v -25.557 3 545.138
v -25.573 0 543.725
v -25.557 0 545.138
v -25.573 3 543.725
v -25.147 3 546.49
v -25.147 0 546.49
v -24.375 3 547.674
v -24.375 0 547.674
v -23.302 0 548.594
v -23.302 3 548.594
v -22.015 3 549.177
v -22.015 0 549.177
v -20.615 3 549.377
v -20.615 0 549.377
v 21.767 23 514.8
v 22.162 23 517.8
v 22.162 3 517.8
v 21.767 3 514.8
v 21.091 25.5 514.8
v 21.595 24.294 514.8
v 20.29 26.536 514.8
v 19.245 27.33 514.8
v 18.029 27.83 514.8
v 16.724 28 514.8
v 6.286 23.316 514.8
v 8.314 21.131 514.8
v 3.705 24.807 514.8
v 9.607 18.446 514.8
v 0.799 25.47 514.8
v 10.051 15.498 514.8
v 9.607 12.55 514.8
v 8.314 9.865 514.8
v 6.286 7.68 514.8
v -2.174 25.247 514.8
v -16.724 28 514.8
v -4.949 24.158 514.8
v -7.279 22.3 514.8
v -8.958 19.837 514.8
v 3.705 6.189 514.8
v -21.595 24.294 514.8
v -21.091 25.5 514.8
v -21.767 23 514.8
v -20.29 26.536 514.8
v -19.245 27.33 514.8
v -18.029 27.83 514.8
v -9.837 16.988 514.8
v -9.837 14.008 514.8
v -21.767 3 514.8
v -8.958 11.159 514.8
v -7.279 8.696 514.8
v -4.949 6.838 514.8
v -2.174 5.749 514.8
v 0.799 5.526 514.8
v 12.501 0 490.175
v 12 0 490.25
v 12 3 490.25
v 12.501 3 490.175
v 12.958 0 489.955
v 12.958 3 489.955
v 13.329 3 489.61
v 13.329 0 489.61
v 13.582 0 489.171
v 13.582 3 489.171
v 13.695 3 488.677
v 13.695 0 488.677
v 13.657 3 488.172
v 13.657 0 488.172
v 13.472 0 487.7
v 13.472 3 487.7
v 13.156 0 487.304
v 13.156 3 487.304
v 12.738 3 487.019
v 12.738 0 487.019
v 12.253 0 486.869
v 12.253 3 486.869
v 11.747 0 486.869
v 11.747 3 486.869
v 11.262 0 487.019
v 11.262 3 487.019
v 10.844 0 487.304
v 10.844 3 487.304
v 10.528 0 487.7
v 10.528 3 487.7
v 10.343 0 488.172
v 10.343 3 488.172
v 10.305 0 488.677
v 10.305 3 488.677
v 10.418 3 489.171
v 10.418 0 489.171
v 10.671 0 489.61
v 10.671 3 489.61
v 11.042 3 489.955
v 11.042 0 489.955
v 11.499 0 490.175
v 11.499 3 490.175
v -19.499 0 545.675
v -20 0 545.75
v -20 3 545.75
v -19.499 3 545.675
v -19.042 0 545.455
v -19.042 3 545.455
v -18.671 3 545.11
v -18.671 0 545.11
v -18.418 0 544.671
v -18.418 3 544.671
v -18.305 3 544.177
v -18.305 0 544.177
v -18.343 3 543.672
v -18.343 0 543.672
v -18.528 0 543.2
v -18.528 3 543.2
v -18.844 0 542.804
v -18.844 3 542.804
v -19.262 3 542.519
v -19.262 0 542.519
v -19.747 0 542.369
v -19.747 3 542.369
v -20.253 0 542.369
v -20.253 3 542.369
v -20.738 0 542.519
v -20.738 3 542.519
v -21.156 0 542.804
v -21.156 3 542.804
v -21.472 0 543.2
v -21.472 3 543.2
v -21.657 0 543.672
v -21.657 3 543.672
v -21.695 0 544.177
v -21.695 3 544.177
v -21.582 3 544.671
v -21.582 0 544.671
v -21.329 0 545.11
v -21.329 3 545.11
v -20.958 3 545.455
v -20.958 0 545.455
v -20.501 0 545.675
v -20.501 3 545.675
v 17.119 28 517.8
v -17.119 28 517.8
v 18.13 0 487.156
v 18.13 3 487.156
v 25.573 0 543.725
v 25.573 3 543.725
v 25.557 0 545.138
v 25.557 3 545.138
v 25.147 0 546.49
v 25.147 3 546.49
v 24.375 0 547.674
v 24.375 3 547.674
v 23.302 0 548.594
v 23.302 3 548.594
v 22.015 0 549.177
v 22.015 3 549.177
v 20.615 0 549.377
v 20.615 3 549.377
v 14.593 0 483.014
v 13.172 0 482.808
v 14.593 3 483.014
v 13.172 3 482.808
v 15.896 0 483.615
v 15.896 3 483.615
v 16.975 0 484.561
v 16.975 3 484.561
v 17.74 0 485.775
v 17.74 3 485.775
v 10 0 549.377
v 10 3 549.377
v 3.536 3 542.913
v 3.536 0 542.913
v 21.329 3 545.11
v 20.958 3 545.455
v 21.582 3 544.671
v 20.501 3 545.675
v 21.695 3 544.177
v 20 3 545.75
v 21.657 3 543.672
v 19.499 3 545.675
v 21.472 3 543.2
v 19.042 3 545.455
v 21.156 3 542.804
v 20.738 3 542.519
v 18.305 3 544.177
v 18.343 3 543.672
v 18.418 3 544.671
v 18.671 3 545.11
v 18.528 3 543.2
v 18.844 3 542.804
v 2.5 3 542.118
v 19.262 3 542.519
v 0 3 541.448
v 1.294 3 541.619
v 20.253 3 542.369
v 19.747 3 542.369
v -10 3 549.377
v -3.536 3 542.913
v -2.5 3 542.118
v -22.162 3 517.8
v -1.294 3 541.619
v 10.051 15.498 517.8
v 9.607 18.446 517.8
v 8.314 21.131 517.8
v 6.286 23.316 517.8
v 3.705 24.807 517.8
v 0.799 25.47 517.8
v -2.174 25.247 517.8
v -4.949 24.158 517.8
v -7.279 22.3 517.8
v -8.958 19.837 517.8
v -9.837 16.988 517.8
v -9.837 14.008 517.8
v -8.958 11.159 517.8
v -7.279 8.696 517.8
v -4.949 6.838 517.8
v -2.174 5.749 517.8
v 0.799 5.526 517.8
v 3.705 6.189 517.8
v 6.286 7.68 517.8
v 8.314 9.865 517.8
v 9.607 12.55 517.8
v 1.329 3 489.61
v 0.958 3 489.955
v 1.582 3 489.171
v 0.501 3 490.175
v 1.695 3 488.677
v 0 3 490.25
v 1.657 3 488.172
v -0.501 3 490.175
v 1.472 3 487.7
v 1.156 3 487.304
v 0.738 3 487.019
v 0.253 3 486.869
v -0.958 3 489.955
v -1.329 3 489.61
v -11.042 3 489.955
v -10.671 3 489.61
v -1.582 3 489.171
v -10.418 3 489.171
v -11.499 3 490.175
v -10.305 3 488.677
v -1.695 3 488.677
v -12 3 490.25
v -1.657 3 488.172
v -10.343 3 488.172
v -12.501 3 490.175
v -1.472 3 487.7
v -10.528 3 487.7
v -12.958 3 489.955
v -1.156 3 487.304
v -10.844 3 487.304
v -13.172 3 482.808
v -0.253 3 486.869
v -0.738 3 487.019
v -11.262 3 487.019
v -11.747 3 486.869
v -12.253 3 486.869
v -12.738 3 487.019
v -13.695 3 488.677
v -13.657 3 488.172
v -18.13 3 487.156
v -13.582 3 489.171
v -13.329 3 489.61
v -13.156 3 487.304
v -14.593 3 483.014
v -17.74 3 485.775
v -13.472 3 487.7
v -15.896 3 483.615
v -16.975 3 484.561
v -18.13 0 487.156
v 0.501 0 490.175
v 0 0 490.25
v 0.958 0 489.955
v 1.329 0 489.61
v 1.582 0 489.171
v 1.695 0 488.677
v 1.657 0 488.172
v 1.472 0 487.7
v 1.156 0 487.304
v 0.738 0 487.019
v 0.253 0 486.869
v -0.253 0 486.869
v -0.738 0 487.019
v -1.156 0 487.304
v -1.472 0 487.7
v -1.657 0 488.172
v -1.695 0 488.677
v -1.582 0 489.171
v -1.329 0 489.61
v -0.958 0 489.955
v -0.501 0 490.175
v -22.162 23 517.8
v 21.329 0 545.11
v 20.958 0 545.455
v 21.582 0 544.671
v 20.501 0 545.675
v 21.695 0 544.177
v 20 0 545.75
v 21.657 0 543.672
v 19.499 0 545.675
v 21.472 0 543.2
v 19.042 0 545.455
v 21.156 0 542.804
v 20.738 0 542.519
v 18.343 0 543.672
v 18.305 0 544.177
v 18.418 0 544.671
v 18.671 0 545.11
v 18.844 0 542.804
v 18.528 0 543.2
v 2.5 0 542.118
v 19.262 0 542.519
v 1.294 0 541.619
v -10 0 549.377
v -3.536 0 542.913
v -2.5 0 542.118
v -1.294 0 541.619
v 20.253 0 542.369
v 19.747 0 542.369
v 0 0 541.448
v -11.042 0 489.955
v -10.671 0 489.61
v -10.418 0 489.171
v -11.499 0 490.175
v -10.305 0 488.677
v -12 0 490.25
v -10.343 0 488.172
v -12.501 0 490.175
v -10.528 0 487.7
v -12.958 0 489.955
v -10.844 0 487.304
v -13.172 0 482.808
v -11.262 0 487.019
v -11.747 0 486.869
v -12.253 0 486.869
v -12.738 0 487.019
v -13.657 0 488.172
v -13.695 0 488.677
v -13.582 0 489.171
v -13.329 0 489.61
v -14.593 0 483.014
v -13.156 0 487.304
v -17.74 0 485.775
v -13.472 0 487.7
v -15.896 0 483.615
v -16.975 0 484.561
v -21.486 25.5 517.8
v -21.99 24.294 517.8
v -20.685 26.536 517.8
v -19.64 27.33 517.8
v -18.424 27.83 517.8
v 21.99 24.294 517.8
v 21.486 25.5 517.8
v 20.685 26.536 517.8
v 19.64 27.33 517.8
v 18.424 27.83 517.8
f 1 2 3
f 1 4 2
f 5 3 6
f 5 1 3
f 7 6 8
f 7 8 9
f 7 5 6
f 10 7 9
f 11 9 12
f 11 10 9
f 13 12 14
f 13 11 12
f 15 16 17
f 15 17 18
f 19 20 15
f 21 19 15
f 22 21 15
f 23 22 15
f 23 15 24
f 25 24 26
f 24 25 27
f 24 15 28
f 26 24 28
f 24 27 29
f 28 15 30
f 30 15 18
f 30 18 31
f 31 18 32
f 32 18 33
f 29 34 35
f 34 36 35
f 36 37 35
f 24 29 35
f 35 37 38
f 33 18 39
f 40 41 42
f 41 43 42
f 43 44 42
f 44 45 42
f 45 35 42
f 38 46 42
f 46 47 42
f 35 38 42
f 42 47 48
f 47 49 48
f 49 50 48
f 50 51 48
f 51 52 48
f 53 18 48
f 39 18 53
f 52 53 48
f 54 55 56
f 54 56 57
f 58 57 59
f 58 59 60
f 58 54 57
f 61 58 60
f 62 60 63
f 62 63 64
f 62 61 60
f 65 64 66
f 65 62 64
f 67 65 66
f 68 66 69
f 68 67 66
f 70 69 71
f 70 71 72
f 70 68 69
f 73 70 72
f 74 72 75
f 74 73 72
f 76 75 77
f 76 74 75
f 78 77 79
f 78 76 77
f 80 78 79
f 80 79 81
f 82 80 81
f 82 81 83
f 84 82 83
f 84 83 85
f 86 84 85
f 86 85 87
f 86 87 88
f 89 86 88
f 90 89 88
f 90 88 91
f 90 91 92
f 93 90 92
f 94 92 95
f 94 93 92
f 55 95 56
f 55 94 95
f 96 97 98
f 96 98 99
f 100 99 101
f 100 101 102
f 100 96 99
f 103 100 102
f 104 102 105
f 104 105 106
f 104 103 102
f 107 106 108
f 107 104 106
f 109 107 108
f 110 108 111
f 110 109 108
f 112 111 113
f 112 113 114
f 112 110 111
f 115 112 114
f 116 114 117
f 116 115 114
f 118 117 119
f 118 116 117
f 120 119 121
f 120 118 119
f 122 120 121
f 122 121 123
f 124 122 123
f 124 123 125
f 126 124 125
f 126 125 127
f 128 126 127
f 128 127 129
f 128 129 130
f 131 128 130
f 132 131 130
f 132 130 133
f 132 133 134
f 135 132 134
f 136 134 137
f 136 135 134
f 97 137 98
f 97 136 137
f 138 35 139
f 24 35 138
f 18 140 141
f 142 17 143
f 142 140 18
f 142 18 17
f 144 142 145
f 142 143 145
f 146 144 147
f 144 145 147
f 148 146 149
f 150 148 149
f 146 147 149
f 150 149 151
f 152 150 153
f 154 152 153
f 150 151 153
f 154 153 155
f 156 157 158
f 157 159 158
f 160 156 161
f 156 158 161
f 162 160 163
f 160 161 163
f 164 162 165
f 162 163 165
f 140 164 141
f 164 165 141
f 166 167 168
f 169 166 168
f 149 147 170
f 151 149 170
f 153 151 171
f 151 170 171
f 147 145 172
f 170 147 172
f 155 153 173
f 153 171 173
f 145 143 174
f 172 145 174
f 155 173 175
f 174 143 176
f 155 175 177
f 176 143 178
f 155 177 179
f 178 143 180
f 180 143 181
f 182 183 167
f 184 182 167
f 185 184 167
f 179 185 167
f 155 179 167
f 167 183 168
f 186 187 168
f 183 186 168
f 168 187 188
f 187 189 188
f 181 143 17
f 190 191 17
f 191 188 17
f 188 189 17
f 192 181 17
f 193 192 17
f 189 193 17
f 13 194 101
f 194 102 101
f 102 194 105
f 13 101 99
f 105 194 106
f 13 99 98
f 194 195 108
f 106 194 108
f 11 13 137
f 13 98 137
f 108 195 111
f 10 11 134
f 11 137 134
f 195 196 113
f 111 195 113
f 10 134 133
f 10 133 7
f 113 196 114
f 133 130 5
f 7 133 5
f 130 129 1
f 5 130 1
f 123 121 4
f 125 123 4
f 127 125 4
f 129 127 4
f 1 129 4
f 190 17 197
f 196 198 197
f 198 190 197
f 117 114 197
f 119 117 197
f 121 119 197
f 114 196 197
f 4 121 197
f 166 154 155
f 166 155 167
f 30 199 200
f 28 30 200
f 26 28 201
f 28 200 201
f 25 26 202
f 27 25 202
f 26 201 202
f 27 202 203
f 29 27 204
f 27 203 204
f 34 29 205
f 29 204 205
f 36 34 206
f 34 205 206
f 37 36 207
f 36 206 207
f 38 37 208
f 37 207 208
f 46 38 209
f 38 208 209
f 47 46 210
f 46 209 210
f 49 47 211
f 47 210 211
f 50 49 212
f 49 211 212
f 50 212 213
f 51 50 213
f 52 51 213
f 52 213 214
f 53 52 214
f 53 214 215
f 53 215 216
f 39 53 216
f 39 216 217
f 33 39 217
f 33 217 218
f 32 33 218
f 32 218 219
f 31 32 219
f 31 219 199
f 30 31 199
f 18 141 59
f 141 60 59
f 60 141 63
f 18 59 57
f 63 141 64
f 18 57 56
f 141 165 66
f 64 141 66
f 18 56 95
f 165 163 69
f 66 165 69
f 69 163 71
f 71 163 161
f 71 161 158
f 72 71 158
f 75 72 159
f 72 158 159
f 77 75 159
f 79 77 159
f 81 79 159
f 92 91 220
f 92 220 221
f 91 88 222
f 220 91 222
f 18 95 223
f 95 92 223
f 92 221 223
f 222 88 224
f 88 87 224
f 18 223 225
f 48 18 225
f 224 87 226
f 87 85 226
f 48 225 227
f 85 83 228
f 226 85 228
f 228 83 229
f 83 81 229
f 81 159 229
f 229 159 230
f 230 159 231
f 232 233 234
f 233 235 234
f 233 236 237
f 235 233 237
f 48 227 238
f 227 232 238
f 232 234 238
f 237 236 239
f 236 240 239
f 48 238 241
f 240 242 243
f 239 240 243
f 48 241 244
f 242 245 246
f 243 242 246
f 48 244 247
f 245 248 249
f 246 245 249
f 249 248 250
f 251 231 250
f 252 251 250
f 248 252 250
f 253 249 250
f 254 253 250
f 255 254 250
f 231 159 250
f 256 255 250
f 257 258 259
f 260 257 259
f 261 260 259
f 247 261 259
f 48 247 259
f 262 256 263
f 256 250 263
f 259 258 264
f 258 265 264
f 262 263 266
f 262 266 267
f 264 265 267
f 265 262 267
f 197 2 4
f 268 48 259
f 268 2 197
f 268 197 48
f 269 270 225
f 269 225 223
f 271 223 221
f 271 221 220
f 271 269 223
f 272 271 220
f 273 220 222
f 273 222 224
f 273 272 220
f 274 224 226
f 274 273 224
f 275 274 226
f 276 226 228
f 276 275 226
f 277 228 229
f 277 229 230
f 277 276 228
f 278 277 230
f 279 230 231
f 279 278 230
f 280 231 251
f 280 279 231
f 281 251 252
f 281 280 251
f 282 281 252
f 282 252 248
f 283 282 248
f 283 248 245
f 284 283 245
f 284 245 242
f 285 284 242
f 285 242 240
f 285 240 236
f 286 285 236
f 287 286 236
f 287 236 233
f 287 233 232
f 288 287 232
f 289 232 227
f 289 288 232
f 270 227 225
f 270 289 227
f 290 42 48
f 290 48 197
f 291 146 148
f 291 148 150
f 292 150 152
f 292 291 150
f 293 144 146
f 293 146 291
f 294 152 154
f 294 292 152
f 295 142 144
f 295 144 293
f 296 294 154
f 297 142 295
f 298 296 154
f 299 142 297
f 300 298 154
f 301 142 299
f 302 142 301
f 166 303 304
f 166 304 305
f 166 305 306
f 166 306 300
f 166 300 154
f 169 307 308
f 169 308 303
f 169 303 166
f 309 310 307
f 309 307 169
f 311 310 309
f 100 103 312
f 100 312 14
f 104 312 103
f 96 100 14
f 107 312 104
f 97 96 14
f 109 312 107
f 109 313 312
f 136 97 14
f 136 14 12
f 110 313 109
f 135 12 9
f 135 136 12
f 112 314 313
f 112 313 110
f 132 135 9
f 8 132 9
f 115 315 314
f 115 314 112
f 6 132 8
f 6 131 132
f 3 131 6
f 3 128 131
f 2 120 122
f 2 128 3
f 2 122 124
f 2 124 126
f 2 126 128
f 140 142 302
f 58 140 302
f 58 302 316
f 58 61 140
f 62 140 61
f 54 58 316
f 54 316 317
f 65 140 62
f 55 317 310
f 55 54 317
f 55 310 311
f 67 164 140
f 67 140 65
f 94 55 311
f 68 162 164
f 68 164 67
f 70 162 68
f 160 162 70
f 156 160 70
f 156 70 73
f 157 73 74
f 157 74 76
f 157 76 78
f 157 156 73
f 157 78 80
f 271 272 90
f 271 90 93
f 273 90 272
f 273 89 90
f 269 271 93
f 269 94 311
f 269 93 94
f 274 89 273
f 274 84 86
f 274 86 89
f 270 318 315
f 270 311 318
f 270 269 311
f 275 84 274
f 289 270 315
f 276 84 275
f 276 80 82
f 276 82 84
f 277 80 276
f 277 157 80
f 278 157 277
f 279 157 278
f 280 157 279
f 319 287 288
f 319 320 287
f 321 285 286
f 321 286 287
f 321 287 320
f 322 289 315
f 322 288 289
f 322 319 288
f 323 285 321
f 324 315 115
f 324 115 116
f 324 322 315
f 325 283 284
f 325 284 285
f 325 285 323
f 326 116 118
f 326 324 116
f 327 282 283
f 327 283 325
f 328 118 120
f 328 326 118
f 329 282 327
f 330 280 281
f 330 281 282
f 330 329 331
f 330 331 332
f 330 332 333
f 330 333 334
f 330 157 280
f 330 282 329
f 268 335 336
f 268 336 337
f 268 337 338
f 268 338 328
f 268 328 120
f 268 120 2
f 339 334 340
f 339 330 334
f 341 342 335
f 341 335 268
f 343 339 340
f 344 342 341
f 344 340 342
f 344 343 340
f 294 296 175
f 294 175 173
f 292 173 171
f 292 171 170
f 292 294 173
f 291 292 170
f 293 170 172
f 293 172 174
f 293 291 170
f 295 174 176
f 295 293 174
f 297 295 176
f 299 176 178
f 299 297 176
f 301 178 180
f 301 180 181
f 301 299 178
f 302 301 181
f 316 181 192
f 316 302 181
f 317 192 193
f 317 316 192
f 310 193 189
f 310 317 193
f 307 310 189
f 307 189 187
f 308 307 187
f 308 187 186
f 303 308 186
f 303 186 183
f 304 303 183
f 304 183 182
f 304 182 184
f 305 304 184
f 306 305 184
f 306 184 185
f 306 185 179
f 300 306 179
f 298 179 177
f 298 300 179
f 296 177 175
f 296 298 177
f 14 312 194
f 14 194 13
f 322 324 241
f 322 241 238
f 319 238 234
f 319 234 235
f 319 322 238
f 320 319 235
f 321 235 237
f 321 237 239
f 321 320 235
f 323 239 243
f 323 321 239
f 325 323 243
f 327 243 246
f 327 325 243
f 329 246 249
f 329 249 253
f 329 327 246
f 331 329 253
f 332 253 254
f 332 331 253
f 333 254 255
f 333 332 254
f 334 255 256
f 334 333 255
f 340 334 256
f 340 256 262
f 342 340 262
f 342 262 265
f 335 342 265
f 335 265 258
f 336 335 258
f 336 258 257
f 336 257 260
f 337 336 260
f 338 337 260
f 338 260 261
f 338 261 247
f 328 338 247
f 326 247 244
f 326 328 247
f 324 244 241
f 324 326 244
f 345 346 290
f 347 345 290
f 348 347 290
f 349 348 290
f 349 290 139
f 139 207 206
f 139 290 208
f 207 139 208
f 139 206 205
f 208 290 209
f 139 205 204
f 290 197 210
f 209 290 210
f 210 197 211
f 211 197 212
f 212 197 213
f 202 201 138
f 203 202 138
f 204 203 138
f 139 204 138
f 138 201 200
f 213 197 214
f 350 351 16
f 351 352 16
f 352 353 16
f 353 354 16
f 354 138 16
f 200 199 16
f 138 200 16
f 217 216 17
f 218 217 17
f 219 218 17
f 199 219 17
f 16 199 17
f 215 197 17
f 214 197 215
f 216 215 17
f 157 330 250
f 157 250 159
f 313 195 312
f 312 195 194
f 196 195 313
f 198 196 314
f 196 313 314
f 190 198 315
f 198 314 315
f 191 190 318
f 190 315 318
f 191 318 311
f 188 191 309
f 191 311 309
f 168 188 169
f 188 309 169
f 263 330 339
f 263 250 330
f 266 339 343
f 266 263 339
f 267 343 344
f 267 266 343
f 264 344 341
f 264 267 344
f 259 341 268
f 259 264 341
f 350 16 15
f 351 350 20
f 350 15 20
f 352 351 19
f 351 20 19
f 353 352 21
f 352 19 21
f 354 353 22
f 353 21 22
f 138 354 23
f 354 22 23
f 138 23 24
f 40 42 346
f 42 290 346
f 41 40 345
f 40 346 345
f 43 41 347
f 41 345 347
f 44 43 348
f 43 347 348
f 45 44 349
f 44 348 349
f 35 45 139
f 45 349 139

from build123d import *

# Parameters (mm, degrees)
SKETCH_1_R          = 1.7
EXTRUDE_2_DEPTH     = 3
EXTRUDE_3_DEPTH     = 25
SKETCH_4_R          = 10
CUT_EXTRUDE_1_DEPTH = 10
CUT_EXTRUDE_2_DEPTH = 10
FILLET_1_R          = 5


with BuildPart() as part:
    # 草图1 → 凸台-拉伸2 (new body)
    with BuildSketch(Plane(origin=(0, 0, 0), x_dir=(1, 0, 0), z_dir=(0, 1, 0))):
        Polygon((-17.55770441, -482.808341248), (17.55770441, -482.808341248), (26.316406952, -549.377139365), (-26.316406952, -549.377139365), align=None)
        with Locations(Location((-20, -544.050368455, 0), (0, 0, 270))):
            Circle(SKETCH_1_R, mode=Mode.SUBTRACT)
        with Locations(Location((20, -544.050368455, 0), (0, 0, 270))):
            Circle(SKETCH_1_R, mode=Mode.SUBTRACT)
        with Locations(Location((0, -488.550368455, 0), (0, 0, 270))):
            Circle(SKETCH_1_R, mode=Mode.SUBTRACT)
        with Locations(Location((-12, -488.550368455, 0), (0, 0, 270))):
            Circle(SKETCH_1_R, mode=Mode.SUBTRACT)
        with Locations(Location((12, -488.550368455, 0), (0, 0, 270))):
            Circle(SKETCH_1_R, mode=Mode.SUBTRACT)
    extrude(amount=EXTRUDE_2_DEPTH)

    # 草图3 → 凸台-拉伸3 (add)
    with BuildSketch(Plane(origin=(0, 3, 0), x_dir=(1, 0, 0), z_dir=(0, 1, 0))):
        Polygon((21.767013545, -514.800368455), (-21.767013545, -514.800368455), (-22.161734621, -517.800368455), (22.161734621, -517.800368455), align=None)
    extrude(amount=EXTRUDE_3_DEPTH)

    # 草图4 → 切除-拉伸1 (cut)
    with BuildSketch(Plane.XY.offset(517.800368455)):
        with Locations((0.051445108, 15.498034667)):
            Circle(SKETCH_4_R)
    extrude(amount=-CUT_EXTRUDE_1_DEPTH, mode=Mode.SUBTRACT)

    # 草图5 → 切除-拉伸2 (cut)
    with BuildSketch(Plane(origin=(0, 3, 0), x_dir=(1, 0, 0), z_dir=(0, 1, 0))):
        Polygon((0, -549.377139365), (10, -549.377139365), (0, -539.377139365), (-10, -549.377139365), align=None)
    extrude(amount=-CUT_EXTRUDE_2_DEPTH, mode=Mode.SUBTRACT)

    # 圆角1
    fillet_1_edges = [part.edges().sort_by_distance(p)[0] for p in [
        (-17.55770441, 1.5, 482.808341248),
        (17.55770441, 1.5, 482.808341248),
        (26.316406952, 1.5, 549.377139365),
        (-26.316406952, 1.5, 549.377139365),
        (-21.964374083, 28, 516.300368455),
        (21.964374083, 28, 516.300368455),
        (0, 1.5, 539.377139365),
    ]]
    fillet(fillet_1_edges, radius=FILLET_1_R)


solid = part.part
